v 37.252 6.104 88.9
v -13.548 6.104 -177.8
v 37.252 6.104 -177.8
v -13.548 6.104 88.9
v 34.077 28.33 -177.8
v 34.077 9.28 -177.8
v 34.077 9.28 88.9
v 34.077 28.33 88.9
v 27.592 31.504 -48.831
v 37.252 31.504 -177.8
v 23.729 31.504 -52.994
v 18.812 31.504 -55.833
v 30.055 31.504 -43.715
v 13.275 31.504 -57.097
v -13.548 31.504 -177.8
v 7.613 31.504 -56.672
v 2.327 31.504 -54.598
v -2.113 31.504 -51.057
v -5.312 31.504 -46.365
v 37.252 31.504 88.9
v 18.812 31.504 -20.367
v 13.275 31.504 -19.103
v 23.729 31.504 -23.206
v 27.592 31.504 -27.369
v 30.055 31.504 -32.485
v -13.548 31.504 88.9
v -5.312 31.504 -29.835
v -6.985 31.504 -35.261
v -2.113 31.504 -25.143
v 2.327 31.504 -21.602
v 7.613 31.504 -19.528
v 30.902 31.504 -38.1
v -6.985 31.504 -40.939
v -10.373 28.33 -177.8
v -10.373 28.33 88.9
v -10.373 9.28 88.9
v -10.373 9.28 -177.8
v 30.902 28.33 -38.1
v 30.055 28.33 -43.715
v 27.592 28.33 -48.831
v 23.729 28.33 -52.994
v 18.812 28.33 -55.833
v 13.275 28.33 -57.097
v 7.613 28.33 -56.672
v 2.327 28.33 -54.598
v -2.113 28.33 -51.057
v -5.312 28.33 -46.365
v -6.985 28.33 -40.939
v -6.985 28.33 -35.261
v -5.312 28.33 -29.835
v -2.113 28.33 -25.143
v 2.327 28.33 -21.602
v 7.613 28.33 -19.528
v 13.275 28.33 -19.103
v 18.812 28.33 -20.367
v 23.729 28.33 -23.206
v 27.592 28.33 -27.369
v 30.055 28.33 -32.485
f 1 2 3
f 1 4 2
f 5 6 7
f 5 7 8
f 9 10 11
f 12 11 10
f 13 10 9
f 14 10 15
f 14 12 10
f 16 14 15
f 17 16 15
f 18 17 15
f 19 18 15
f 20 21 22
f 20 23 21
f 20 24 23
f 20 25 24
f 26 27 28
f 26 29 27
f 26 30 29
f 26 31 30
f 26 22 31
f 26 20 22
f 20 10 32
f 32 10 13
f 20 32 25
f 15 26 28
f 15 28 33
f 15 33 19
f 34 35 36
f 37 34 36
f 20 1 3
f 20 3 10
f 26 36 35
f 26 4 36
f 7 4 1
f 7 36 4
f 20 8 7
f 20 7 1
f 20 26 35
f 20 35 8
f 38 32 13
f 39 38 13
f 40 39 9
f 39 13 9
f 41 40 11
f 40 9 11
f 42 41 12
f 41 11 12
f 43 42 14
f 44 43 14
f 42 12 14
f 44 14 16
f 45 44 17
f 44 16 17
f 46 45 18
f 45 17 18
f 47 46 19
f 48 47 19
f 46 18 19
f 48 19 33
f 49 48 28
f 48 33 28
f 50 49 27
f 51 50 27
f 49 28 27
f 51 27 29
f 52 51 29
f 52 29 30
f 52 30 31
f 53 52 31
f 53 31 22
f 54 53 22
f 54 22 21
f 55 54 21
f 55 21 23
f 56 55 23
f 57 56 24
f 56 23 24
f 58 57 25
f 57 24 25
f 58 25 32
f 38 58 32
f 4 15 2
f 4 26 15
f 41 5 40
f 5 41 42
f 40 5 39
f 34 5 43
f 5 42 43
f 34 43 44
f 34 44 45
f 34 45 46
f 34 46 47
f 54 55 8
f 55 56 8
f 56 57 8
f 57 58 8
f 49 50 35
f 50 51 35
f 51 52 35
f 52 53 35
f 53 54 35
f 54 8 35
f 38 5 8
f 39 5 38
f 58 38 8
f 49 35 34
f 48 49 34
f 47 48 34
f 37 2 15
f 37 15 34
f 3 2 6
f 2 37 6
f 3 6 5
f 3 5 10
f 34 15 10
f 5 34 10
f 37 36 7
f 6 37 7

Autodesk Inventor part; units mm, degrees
ref_plane "YZ Plane" through (0, 0, 0) normal (1, 0, 0) x (0, 1, 0)
ref_plane "XZ Plane" through (0, 0, 0) normal (0, 1, 0) x (-1, 0, 0)
ref_plane "XY Plane" through (0, 0, 0) normal (0, 0, 1) x (1, 0, 0)
sketch "Sketch1" plane through (0, 0, 0) normal (0, 0, 1) x (1, 0, 0)
  line L0 (37.2518, 31.5045) -> (-13.5482, 31.5045)
  line L1 (-13.5482, 31.5045) -> (-13.5482, 6.1045)
  line L2 (-13.5482, 6.1045) -> (37.2518, 6.1045)
  line L3 (37.2518, 6.1045) -> (37.2518, 31.5045)
  line L4 (34.0768, 28.3295) -> (-10.3732, 28.3295)
  line L5 (-10.3732, 28.3295) -> (-10.3732, 9.2795)
  line L6 (-10.3732, 9.2795) -> (34.0768, 9.2795)
  line L7 (34.0768, 9.2795) -> (34.0768, 28.3295)
  point P0 (0, 0)
  dimension "d0" = 50.8
  dimension "d1" = 25.4
  dimension "d2" = 3.175
extrude "Extrusion1" add sketch "Sketch1" against normal blind 177.8 and the other way blind 88.9
sketch "Sketch2" plane through (-13.5482, 31.5045, -177.8) normal (0, 1, 0) x (1, 0, 0)
  circle A0 centre (25.4, -139.7) radius 19.05
  line L0 (50.8, -266.7) -> (0, -266.7) projected
  point P0 (13.5482, -177.8)
  point P1 (25.4, -266.7)
  dimension "d7" = 38.1
  dimension "d8" = 127
extrude "Extrusion2" cut sketch "Sketch2" against normal blind 3.175
properties part number "Motor Mount"
